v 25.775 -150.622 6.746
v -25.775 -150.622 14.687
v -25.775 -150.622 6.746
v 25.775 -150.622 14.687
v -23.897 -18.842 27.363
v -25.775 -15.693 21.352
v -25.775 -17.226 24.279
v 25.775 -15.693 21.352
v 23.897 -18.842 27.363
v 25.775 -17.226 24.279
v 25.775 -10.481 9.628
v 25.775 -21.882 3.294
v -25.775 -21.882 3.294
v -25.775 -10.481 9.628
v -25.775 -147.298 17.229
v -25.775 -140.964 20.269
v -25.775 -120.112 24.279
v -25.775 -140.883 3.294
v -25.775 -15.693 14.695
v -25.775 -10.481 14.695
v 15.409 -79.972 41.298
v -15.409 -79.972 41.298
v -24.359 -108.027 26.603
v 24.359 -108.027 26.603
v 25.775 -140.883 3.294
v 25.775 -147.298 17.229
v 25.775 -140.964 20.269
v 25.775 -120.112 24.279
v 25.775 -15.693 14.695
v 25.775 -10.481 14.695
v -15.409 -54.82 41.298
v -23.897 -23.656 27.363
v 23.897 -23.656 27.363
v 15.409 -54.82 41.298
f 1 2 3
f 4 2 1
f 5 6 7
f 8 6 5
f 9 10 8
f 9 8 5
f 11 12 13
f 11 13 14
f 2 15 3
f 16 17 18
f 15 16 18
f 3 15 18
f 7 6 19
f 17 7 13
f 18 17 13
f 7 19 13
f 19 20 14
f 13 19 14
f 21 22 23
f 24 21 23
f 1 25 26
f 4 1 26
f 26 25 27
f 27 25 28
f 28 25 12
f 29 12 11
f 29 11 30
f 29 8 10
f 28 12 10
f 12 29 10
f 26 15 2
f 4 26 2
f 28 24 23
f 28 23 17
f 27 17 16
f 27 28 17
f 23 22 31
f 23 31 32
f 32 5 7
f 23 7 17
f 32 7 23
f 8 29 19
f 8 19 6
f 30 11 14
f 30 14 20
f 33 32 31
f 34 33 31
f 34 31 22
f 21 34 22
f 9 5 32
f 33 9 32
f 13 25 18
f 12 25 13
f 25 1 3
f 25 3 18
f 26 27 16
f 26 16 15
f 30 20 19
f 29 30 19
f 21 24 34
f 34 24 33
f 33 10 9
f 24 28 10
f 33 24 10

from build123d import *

# Parameters (mm, degrees)
F1_DEPTH = 150.622
F3_START = 88.392
F3_DEPTH = 114.1679836892


with BuildPart() as f1:
    # F0 (on Front) → F1 (new body)
    with BuildSketch(Plane.XZ):
        Polygon((-25.7749836892, 0), (0, 0), (25.7749836892, 0), (25.7749836892, 24.2791596506), (6.3844995154, 56.1167374253), (0, 56.1167374253), (-6.3844995154, 56.1167374253), (-25.7749836892, 24.2791596506), align=None)
    extrude(amount=F1_DEPTH)

    # F2 (on Right) → F3 (intersect)
    with BuildSketch(Plane.YZ.offset(F3_START)):
        Polygon((-151.6052931547, 13.9350751415), (-151.6052931547, 7.0942197926), (-140.8825235742, 3.293744754), (-21.8824129552, 3.293744754), (-10.4809878394, 9.627870284), (-10.4809878394, 14.6951703355), (-15.693005628, 14.6951703355), (-15.693005628, 21.3516374031), (-18.8420340419, 27.3634195328), (-23.6559715122, 27.3634195328), (-54.8198632896, 41.2984937429), (-79.972098349, 41.2984937429), (-108.0265119672, 26.6033262014), (-140.9639567137, 20.2692002058), (-147.2980827093, 17.2288194299), align=None)
    extrude(amount=-F3_DEPTH, mode=Mode.INTERSECT)


solid = f1.part
